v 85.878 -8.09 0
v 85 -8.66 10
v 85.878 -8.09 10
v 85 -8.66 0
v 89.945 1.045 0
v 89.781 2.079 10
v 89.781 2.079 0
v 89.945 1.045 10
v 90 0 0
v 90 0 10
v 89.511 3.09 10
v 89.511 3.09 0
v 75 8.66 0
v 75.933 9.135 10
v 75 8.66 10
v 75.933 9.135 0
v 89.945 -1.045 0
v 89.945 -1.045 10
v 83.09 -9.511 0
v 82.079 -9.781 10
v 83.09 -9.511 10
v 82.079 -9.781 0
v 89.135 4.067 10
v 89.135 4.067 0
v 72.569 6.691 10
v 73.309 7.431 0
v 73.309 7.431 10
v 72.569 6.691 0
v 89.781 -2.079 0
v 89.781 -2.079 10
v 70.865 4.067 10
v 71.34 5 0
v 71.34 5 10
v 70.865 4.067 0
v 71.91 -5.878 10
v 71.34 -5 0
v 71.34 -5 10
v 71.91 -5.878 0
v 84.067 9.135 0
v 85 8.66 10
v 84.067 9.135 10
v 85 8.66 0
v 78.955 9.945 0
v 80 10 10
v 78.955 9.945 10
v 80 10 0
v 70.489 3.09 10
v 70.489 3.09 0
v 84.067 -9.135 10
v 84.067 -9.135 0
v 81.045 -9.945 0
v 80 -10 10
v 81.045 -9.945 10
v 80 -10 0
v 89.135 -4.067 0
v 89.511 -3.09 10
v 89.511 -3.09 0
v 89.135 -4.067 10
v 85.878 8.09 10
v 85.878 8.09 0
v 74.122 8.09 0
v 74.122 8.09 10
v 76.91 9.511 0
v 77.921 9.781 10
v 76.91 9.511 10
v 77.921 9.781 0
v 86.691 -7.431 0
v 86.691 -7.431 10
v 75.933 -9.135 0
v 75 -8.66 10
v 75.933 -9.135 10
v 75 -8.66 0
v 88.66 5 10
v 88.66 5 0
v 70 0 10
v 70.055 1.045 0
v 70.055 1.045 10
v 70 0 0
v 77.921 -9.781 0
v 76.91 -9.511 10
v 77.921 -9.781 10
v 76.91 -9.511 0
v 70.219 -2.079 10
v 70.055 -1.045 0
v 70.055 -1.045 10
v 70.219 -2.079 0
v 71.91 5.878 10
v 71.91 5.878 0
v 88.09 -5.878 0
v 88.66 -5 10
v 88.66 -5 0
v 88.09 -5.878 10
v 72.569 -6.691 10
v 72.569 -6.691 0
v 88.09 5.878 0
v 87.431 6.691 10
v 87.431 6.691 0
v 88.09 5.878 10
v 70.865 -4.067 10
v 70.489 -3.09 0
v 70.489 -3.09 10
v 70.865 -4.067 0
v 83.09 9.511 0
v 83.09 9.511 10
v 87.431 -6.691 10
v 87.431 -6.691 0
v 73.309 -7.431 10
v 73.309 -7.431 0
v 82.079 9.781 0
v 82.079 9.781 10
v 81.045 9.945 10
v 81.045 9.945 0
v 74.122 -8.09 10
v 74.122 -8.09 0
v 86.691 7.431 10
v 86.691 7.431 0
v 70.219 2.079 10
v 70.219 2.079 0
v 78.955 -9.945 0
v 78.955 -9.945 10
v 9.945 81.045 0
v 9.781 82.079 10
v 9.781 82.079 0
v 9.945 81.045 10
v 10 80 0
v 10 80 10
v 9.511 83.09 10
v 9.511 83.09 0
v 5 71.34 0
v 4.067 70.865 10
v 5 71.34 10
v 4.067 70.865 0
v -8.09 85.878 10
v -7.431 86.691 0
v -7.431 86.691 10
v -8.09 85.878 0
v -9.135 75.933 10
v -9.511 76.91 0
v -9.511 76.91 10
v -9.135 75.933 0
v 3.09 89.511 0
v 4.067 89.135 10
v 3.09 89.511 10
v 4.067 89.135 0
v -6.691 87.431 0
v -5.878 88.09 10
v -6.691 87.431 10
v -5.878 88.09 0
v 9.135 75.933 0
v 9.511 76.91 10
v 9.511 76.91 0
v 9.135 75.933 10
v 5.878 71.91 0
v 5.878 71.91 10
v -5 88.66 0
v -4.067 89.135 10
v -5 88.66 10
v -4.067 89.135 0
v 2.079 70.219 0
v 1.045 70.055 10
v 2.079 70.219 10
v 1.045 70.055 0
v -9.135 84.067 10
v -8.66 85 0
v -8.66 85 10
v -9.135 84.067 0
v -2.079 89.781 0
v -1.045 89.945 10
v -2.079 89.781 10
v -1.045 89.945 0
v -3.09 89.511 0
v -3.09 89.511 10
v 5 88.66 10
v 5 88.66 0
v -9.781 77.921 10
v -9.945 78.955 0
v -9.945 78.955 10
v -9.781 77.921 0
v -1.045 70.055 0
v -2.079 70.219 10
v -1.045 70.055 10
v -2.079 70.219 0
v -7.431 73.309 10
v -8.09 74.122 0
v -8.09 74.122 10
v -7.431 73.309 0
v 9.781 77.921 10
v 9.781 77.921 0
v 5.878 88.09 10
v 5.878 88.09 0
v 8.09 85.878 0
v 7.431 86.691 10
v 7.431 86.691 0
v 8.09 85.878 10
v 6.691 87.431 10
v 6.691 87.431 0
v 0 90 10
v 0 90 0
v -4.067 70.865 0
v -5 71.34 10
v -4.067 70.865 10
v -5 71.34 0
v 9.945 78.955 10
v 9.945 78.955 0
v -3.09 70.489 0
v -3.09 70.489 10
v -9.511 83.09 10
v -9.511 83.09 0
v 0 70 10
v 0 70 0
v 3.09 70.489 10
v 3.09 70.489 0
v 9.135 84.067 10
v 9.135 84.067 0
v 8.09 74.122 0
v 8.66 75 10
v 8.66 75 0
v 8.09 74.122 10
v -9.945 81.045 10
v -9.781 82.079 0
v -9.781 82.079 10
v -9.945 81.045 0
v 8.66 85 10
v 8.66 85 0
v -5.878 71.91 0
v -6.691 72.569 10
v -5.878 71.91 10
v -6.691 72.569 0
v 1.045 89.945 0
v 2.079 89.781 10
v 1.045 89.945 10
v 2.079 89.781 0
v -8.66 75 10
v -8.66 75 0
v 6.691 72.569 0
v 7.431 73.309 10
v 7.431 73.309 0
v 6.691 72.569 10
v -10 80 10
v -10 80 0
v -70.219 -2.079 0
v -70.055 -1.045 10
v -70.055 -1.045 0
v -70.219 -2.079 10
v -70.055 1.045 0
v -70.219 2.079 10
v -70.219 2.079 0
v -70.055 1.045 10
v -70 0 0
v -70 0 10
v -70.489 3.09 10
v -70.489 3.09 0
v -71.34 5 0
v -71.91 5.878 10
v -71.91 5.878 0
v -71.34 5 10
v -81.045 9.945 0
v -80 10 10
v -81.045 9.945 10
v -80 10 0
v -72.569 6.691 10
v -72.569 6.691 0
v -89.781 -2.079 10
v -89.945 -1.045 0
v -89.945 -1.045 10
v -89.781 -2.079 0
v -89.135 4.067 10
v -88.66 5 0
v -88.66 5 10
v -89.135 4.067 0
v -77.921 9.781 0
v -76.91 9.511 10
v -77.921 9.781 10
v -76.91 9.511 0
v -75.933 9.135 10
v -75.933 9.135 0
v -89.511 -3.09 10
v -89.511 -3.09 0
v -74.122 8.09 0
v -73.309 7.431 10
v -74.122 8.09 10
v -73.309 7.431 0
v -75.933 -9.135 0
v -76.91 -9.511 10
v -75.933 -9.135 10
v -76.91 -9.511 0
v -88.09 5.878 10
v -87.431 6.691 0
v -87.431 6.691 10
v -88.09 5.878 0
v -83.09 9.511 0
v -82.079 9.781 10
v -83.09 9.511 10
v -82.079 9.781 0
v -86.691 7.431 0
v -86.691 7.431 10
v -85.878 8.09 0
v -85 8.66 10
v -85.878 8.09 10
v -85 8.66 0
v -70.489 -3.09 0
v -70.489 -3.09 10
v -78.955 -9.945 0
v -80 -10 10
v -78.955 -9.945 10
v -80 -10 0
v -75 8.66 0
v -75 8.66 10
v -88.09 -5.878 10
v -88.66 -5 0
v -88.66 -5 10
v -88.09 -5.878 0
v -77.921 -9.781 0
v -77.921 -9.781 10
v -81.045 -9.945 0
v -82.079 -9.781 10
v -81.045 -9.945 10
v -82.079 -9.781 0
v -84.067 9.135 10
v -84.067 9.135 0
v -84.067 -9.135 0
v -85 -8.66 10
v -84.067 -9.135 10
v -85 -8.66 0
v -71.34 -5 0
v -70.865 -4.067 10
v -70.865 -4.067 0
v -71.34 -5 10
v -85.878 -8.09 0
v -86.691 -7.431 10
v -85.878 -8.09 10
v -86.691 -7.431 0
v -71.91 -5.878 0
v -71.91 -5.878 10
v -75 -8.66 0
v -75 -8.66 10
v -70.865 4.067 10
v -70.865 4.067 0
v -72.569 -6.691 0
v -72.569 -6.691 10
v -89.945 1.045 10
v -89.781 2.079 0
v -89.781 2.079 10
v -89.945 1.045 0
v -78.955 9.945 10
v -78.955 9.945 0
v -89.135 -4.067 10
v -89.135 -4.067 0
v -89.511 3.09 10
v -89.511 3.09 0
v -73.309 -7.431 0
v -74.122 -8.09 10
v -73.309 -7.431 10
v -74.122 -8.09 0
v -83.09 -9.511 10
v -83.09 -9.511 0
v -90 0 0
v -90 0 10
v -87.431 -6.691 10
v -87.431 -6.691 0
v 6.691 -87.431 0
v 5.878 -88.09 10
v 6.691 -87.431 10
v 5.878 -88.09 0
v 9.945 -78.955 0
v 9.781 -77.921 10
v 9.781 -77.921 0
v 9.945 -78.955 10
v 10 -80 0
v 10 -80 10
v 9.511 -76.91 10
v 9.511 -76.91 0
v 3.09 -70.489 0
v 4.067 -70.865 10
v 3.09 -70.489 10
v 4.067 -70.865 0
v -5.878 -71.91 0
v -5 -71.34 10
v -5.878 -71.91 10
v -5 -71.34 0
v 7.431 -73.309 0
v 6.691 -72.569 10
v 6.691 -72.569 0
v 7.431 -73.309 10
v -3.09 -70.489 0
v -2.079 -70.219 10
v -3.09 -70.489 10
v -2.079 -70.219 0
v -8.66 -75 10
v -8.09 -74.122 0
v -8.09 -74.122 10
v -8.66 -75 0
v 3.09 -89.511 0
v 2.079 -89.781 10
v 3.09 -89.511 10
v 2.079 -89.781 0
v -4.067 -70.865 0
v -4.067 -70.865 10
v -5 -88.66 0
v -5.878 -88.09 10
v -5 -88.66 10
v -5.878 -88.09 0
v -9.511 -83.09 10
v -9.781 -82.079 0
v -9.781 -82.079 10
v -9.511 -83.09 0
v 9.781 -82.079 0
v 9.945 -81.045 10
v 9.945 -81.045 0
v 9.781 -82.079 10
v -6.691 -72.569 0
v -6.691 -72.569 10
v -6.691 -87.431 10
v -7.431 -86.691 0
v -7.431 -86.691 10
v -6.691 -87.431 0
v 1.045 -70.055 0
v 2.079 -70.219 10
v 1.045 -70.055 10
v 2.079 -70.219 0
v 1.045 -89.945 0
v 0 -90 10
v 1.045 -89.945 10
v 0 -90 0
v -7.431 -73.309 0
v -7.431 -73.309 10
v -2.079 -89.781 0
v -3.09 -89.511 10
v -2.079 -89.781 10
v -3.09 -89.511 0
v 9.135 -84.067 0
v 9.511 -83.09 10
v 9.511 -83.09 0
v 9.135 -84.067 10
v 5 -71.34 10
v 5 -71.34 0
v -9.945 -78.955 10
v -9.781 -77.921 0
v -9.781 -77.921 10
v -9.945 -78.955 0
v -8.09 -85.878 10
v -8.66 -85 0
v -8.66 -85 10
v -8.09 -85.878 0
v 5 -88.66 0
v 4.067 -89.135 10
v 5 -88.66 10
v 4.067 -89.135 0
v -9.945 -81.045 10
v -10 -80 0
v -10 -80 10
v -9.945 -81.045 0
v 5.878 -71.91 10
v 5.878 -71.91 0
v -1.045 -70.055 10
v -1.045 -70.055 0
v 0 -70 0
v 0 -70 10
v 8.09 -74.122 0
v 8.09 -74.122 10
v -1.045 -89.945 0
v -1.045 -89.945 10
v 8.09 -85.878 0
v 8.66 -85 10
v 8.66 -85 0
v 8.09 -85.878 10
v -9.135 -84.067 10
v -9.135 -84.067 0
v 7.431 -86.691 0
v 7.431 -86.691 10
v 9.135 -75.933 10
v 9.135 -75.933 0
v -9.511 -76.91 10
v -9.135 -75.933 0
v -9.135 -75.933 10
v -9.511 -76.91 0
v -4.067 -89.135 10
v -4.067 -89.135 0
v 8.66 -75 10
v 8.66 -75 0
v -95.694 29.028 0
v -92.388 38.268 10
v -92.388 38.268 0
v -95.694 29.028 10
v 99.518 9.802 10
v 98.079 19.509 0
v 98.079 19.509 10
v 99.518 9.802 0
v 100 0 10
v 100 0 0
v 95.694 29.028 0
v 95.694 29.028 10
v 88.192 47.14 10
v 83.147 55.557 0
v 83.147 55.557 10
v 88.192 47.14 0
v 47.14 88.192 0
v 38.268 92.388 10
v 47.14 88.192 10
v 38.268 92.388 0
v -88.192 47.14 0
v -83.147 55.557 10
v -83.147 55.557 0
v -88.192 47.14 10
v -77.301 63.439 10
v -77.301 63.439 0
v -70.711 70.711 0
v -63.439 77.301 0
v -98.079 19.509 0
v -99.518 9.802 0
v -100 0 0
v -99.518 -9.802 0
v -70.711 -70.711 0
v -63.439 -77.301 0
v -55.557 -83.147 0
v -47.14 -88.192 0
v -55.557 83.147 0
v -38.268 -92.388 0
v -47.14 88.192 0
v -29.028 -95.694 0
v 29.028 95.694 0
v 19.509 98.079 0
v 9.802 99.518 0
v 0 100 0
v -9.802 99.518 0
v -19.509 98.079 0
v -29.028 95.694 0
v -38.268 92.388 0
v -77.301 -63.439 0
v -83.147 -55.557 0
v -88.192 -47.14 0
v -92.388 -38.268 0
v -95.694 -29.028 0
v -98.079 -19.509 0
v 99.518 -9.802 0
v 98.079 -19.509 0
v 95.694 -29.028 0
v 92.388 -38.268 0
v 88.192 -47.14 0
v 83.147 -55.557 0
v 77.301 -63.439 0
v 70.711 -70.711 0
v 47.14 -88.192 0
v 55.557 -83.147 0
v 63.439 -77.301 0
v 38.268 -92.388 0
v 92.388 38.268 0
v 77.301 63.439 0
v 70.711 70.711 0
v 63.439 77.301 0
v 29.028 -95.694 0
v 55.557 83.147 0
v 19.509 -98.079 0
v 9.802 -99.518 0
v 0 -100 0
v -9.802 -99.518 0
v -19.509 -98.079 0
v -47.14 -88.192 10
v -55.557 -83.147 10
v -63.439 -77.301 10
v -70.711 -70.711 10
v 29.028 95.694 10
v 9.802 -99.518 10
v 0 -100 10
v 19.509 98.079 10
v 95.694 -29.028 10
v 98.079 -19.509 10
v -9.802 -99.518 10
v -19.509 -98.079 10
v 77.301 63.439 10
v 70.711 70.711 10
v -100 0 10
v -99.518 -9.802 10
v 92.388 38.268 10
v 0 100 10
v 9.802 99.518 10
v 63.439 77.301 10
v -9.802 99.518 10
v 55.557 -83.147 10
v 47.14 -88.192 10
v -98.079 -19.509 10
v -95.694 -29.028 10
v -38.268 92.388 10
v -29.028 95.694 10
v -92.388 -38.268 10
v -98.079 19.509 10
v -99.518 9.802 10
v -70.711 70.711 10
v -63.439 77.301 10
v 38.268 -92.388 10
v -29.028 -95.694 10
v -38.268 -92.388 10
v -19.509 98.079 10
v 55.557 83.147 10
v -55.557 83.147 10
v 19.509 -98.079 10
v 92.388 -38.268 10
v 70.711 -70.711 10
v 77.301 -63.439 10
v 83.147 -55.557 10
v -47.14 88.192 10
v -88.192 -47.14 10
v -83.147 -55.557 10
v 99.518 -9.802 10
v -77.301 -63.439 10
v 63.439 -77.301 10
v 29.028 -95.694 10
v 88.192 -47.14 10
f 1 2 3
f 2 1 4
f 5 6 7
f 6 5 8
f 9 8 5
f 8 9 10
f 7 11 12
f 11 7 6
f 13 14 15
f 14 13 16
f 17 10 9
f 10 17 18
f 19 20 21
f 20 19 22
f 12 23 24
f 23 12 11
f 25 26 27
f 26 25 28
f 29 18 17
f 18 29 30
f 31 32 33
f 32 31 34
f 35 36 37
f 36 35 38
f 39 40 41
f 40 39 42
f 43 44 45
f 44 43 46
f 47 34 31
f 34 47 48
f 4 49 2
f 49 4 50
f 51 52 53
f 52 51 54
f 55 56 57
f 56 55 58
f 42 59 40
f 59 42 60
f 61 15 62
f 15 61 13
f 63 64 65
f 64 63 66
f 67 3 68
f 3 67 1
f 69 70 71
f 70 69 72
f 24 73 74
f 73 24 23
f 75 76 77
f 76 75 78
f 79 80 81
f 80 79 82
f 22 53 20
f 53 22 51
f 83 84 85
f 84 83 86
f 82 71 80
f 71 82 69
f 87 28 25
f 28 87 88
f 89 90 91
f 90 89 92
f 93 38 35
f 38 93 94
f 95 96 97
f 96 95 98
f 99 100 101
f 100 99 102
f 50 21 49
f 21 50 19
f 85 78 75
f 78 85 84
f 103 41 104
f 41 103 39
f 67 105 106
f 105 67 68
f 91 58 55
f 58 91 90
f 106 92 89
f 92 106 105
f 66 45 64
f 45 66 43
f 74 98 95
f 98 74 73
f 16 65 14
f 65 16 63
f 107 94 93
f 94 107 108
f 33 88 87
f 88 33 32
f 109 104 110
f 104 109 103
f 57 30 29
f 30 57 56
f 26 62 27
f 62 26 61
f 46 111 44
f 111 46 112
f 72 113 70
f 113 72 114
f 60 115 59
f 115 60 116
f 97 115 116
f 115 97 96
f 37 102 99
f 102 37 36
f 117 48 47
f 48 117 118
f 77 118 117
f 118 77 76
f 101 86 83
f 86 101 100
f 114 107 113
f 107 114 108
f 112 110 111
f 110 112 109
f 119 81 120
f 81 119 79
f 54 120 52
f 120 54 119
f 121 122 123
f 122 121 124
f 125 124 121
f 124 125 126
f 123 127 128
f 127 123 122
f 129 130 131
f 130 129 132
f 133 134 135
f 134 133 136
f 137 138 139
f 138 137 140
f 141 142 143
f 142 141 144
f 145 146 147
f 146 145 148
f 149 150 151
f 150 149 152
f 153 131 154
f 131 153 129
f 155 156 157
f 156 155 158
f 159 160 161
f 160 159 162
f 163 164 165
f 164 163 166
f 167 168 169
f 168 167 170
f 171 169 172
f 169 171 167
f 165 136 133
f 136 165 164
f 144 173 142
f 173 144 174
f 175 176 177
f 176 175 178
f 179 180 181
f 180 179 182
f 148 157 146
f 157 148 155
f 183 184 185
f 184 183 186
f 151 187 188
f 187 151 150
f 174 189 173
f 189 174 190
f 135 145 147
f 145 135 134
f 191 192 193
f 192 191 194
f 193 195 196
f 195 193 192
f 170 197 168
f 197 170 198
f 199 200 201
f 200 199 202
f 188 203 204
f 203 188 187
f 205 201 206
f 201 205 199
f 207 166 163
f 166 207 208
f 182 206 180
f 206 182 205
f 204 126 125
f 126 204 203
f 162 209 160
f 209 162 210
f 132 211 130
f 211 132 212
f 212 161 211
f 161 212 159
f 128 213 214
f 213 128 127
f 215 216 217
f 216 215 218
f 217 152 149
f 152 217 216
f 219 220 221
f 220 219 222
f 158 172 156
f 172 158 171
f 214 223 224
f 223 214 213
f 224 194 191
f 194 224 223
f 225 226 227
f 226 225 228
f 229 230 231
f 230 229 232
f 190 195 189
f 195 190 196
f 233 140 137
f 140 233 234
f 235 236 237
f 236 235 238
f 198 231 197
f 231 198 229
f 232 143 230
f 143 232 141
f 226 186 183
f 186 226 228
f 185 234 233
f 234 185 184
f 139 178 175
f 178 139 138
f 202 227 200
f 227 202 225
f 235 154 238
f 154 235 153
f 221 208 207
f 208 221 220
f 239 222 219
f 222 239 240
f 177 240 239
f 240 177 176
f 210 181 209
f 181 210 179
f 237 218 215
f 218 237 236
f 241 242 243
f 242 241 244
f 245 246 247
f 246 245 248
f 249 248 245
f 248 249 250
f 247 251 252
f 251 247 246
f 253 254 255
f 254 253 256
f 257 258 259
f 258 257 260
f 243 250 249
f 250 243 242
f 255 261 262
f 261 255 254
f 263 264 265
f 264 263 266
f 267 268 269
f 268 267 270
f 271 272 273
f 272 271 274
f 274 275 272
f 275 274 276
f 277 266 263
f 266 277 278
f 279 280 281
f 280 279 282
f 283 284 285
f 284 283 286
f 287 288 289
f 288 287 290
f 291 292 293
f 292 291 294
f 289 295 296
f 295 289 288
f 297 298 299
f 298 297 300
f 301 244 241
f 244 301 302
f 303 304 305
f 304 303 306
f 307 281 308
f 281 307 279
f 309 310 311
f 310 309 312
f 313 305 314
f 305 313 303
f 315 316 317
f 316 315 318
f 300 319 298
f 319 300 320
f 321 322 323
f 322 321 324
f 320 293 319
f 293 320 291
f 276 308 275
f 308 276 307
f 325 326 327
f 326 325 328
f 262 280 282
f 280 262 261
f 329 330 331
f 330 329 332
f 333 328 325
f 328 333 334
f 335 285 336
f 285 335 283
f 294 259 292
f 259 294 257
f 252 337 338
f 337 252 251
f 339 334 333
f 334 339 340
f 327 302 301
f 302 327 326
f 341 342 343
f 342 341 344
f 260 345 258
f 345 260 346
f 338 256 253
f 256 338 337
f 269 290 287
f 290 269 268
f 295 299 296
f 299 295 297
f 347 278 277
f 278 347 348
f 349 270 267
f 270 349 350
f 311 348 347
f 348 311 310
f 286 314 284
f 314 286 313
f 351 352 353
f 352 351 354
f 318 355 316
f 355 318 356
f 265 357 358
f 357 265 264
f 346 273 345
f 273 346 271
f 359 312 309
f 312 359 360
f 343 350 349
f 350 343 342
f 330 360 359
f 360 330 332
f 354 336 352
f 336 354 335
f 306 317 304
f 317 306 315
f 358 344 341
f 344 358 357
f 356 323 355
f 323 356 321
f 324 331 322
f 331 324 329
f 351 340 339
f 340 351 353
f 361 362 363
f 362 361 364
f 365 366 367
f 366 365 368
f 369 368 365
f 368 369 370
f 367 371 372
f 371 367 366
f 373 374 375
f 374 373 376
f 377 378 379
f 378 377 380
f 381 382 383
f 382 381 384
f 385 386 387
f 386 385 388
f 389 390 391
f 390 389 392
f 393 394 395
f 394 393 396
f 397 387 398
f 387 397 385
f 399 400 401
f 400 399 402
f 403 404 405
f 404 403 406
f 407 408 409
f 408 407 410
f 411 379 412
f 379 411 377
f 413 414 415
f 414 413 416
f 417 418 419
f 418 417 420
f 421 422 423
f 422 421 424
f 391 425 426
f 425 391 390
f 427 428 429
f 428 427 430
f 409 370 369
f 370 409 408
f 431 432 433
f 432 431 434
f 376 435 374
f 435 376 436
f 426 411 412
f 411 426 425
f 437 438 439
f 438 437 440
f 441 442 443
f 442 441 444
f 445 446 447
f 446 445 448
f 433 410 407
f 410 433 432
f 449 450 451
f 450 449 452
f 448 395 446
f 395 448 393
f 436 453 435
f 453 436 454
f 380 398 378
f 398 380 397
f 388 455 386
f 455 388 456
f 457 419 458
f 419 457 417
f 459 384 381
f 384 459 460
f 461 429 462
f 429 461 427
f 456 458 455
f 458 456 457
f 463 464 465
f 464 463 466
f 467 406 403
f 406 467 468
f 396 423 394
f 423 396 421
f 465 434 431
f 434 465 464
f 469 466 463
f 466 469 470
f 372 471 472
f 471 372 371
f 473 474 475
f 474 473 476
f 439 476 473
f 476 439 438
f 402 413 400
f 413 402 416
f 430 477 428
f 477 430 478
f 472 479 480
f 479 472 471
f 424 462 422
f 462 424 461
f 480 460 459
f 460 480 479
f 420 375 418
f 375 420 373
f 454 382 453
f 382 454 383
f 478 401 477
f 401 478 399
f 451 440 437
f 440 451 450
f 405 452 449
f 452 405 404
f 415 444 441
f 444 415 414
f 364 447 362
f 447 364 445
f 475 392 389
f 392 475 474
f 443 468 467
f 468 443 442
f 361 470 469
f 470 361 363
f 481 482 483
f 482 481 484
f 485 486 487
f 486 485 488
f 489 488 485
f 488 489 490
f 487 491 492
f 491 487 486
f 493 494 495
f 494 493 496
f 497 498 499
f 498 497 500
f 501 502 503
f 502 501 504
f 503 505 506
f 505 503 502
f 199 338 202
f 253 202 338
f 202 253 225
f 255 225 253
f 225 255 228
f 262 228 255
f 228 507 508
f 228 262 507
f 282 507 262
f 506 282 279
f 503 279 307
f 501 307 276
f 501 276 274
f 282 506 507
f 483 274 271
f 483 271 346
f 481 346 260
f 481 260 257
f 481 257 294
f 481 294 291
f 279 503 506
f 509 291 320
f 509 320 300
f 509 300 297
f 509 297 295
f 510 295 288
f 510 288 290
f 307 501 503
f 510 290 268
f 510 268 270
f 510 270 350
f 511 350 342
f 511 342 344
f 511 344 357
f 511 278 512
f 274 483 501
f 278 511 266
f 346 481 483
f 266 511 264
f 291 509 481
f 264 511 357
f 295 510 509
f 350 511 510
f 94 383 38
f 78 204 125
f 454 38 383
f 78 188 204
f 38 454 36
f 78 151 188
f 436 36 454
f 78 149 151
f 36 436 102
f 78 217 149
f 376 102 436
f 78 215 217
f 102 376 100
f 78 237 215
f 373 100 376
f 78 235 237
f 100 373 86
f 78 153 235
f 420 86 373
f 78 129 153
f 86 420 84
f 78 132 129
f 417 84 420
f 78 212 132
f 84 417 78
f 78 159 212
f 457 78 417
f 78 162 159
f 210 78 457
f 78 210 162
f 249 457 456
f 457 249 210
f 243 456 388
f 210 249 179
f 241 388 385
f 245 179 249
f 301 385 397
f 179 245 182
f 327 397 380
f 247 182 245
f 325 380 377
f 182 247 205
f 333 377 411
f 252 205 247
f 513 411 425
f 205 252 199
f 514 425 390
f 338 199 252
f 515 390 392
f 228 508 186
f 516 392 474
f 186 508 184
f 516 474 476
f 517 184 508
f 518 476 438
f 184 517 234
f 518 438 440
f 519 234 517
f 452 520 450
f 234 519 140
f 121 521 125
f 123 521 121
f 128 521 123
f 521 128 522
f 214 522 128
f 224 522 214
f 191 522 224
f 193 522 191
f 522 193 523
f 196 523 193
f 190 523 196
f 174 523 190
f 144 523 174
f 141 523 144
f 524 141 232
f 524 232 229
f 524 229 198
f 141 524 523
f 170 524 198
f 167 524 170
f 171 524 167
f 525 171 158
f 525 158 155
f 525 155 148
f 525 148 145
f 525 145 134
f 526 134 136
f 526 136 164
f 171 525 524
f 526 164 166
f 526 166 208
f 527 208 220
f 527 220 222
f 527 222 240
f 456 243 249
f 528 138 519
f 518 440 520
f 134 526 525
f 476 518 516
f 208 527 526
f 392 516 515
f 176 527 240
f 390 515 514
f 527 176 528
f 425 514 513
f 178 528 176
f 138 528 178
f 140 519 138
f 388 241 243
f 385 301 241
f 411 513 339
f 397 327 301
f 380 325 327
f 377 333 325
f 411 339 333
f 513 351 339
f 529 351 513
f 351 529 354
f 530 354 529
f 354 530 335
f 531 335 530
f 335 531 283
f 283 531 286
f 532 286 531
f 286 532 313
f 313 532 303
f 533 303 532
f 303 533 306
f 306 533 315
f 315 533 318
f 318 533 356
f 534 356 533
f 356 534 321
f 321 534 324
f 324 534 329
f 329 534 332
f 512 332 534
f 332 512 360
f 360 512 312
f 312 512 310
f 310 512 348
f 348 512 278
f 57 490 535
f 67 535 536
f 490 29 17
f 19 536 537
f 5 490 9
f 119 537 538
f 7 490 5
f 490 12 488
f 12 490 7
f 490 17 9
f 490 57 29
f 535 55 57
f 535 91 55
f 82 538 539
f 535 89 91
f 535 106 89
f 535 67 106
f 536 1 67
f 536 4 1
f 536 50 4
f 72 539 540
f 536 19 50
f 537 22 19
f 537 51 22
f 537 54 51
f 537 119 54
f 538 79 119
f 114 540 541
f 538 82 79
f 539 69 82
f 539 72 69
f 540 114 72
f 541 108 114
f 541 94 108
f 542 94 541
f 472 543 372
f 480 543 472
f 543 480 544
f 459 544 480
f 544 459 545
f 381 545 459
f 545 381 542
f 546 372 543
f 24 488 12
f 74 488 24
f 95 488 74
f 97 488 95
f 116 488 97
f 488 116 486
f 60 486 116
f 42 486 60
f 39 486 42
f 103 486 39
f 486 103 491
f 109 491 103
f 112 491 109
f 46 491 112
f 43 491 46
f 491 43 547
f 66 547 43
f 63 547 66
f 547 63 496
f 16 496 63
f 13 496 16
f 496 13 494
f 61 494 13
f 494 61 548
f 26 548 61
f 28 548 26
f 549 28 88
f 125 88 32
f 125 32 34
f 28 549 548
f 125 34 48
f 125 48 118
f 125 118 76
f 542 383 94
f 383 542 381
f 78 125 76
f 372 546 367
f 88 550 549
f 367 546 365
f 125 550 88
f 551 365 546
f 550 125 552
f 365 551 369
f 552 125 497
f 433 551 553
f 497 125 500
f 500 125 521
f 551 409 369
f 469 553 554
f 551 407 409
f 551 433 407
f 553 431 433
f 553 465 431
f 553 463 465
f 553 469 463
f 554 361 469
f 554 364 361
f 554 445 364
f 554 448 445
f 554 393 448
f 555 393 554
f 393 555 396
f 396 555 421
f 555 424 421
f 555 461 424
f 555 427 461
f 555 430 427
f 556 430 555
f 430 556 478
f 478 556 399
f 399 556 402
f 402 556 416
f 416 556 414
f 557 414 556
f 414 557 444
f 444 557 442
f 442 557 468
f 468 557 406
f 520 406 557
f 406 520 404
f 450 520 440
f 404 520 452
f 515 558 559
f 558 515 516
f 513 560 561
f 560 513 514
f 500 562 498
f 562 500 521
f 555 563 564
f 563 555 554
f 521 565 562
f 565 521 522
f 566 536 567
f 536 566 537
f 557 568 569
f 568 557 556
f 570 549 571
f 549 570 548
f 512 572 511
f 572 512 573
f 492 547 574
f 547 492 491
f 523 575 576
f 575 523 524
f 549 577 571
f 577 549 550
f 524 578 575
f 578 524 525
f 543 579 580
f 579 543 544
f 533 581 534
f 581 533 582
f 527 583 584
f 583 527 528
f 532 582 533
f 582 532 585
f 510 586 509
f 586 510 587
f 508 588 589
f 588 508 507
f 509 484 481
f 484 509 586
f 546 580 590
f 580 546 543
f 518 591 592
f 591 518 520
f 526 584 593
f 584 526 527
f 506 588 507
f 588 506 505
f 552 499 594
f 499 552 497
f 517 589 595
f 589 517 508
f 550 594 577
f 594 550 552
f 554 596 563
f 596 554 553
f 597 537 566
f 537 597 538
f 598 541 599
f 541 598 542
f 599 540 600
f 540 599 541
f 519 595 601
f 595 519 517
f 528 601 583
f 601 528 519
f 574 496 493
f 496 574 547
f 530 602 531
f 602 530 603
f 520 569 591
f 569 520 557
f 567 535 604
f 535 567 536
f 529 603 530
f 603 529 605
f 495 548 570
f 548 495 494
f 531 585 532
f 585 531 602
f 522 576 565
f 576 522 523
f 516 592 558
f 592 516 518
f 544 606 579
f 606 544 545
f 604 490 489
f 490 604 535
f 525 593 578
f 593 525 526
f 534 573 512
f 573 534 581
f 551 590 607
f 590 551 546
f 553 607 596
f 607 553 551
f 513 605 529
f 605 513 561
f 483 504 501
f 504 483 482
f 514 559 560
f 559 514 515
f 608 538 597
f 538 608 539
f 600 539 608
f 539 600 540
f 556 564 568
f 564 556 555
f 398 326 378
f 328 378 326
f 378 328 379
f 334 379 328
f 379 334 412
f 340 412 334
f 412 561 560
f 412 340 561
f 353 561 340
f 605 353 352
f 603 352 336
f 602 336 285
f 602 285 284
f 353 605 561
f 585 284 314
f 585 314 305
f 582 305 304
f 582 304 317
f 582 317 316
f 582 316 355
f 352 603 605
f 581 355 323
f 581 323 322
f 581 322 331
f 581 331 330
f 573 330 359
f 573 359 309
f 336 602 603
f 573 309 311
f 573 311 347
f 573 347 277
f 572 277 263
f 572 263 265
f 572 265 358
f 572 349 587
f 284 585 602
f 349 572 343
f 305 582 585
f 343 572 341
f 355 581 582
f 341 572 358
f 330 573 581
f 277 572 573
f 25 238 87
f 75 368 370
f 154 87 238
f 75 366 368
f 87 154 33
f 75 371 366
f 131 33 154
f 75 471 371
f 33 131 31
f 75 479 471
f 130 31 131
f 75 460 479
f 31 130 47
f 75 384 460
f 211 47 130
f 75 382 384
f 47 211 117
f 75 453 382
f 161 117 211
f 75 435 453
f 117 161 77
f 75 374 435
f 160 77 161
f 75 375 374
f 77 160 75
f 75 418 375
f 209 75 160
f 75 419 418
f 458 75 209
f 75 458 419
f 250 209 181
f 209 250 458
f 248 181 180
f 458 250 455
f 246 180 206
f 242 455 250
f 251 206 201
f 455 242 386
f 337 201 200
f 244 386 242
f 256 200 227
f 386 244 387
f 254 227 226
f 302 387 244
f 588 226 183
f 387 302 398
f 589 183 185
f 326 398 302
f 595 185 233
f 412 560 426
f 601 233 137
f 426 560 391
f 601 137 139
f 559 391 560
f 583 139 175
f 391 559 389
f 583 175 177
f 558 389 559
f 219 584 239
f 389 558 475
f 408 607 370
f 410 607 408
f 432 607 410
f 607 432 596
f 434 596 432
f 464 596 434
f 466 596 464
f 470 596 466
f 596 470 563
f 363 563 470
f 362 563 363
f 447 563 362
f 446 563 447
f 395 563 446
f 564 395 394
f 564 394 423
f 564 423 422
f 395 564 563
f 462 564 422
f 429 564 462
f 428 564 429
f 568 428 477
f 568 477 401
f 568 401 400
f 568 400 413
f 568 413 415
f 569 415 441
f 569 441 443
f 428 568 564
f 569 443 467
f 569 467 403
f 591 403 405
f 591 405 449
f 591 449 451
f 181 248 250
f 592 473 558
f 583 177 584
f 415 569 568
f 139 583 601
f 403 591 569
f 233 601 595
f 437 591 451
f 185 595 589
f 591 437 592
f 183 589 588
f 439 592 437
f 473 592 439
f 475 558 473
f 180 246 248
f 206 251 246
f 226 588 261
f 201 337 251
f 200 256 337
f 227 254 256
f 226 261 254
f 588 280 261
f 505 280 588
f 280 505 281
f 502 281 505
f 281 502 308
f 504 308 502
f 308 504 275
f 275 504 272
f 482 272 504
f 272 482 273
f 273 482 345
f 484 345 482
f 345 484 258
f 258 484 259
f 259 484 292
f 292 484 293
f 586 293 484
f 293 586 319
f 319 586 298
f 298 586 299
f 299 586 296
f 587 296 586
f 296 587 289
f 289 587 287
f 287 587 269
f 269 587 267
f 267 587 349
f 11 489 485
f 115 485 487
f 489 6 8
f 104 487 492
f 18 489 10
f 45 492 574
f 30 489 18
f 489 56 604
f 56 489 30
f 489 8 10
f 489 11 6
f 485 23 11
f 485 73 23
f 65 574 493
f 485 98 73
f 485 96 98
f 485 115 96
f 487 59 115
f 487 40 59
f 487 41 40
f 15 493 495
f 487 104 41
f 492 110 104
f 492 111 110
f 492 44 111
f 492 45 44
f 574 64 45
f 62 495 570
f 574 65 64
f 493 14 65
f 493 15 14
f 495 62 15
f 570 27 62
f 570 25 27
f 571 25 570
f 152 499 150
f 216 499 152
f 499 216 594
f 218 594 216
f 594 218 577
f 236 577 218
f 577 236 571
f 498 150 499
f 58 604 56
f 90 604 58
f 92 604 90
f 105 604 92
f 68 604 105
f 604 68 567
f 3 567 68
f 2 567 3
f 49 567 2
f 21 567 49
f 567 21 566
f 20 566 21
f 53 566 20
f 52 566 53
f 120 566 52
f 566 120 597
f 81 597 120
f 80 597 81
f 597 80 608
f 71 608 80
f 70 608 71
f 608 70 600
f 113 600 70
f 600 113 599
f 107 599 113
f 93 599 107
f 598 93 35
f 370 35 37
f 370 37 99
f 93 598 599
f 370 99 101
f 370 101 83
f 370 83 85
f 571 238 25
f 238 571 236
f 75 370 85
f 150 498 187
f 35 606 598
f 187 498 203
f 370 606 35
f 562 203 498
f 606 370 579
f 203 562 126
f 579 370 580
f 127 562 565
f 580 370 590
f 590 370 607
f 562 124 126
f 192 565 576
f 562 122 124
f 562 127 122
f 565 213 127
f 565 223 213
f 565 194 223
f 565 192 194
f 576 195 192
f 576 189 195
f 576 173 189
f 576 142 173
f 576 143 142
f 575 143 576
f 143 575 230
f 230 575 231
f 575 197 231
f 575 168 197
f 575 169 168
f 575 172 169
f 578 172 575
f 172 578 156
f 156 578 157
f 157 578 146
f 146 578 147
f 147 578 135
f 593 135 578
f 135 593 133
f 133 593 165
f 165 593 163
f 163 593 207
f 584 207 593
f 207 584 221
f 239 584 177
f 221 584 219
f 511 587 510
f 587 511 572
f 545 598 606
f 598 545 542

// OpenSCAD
difference(){
cylinder(10,100,100, $fn = $preview ? 32 : 64);

r = 80;
for (i=[0:90:359]) {
    translate([r*cos(i),r*sin(i),-1])
        cylinder(12,10,10,$fn=60);
}

}
